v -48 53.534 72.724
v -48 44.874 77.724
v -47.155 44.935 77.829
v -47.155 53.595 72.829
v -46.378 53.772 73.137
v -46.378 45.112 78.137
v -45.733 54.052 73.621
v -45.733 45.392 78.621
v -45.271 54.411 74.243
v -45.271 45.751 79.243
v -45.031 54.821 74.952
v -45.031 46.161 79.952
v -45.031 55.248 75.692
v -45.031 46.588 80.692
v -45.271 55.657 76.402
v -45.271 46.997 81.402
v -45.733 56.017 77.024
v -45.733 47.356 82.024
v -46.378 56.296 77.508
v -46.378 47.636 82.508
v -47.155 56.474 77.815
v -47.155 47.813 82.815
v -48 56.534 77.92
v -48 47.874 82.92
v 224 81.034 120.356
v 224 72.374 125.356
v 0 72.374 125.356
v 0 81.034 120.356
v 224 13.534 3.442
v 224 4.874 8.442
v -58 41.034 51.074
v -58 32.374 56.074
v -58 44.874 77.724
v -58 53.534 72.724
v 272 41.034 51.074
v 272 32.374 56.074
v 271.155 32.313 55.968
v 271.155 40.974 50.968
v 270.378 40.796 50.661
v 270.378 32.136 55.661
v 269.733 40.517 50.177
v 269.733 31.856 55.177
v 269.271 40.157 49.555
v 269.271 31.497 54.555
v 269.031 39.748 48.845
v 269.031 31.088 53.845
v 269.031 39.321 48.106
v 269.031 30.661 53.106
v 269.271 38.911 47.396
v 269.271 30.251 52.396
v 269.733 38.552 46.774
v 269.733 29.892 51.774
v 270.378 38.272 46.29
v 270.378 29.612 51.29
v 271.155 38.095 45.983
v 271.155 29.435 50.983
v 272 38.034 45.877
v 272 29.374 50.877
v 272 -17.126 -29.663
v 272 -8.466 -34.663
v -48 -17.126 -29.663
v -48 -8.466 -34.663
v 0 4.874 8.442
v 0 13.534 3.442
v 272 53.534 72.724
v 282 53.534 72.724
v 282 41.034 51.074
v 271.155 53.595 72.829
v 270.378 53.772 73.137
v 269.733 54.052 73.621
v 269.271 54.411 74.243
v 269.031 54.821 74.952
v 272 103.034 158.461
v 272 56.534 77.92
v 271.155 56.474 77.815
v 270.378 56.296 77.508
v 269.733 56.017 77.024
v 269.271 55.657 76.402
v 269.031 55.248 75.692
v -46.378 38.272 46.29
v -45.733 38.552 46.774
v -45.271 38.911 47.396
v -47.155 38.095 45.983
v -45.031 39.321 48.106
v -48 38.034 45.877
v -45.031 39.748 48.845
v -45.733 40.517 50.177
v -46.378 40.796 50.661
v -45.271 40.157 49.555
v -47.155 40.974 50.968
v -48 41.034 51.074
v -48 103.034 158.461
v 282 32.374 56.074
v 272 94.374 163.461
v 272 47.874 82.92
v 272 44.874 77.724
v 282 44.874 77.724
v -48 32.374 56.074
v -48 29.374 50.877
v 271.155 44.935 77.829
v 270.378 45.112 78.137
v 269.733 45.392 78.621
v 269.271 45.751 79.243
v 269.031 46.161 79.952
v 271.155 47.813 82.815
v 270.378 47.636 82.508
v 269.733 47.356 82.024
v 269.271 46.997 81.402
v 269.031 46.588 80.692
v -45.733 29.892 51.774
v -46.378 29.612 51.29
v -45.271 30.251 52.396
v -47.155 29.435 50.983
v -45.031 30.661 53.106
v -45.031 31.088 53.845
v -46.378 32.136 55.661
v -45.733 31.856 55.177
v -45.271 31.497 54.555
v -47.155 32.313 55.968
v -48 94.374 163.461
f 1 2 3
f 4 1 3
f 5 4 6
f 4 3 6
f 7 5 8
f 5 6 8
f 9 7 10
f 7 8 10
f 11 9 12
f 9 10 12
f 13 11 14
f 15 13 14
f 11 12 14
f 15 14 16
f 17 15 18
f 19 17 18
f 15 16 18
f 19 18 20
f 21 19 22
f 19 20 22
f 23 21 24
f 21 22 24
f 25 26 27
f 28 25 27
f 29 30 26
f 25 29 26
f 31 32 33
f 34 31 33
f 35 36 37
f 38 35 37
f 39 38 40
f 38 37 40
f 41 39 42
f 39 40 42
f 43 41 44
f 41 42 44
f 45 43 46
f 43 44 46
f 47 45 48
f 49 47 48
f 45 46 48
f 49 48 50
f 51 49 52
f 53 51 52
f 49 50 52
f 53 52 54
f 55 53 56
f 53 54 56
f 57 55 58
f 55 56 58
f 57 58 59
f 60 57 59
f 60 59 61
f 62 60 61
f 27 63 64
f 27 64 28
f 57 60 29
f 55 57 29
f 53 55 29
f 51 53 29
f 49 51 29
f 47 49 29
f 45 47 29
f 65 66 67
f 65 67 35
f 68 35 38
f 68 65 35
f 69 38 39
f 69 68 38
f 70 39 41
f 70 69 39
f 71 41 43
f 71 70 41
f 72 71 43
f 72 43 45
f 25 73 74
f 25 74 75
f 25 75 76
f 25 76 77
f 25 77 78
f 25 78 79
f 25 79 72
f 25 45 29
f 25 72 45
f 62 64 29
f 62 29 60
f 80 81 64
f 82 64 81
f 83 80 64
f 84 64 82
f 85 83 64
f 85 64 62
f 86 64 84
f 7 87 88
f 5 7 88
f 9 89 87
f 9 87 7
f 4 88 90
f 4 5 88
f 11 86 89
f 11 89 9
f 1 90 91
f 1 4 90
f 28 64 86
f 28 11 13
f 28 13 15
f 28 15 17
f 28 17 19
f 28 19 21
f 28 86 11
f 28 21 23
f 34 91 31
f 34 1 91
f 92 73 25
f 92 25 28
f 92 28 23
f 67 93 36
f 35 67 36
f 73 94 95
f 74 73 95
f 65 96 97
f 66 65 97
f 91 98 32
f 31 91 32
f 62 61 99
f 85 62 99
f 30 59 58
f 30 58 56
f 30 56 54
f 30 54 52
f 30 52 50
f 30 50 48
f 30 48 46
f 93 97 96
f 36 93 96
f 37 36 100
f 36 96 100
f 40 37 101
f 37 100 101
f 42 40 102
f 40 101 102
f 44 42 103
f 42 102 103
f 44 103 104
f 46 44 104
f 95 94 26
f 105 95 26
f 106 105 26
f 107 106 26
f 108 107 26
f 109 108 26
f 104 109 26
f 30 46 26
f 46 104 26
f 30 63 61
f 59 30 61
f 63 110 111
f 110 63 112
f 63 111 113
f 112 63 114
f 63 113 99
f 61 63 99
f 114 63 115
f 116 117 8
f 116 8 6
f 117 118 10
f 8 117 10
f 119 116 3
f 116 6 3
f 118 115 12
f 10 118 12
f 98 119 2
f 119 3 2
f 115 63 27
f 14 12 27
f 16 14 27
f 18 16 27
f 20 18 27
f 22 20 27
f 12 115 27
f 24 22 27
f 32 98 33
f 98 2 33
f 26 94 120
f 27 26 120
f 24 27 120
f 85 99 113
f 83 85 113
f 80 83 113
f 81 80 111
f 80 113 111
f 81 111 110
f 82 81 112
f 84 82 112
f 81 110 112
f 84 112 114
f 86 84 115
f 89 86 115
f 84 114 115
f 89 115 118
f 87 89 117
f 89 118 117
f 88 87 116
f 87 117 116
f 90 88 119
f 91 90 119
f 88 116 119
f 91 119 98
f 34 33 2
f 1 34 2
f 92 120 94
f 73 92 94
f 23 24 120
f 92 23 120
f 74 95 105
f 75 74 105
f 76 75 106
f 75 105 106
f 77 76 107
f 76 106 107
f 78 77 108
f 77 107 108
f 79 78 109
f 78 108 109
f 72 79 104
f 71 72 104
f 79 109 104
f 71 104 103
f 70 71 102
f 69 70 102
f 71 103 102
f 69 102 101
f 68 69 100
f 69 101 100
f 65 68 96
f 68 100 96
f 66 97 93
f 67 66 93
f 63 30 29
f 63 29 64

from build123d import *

# Parameters (mm, degrees)
F2_W     = 224
F2_H     = 135
F3_DEPTH = 10


with BuildPart() as f3:
    # F2 (on face) → F3 (new body)
    with BuildSketch(Plane(origin=(0, 0, 0), x_dir=(-1, 0, 0), z_dir=(0, 0.866025, -0.5))):
        with BuildLine():
            Line((-112, 188.748146), (-272, 188.748146))
            Line((-272, 188.748146), (-272, 95.748146))
            ThreePointArc((-272, 95.748146), (-269, 92.748146), (-272, 89.748146))
            Line((-272, 89.748146), (-282, 89.748146))
            Line((-282, 89.748146), (-282, 64.748146))
            Line((-282, 64.748146), (-272, 64.748146))
            ThreePointArc((-272, 64.748146), (-269, 61.748146), (-272, 58.748146))
            Line((-272, 58.748146), (-272, -34.251854))
            Line((-272, -34.251854), (-112, -34.251854))
            Line((-112, -34.251854), (48, -34.251854))
            Line((48, -34.251854), (48, 58.748146))
            ThreePointArc((48, 58.748146), (45, 61.748146), (48, 64.748146))
            Line((48, 64.748146), (58, 64.748146))
            Line((58, 64.748146), (58, 89.748146))
            Line((58, 89.748146), (48, 89.748146))
            ThreePointArc((48, 89.748146), (45, 92.748146), (48, 95.748146))
            Line((48, 95.748146), (48, 188.748146))
            Line((48, 188.748146), (-112, 188.748146))
        make_face()
        with Locations((-112, 77.248146)):
            Rectangle(F2_W, F2_H, mode=Mode.SUBTRACT)
    extrude(amount=F3_DEPTH)


solid = f3.part
